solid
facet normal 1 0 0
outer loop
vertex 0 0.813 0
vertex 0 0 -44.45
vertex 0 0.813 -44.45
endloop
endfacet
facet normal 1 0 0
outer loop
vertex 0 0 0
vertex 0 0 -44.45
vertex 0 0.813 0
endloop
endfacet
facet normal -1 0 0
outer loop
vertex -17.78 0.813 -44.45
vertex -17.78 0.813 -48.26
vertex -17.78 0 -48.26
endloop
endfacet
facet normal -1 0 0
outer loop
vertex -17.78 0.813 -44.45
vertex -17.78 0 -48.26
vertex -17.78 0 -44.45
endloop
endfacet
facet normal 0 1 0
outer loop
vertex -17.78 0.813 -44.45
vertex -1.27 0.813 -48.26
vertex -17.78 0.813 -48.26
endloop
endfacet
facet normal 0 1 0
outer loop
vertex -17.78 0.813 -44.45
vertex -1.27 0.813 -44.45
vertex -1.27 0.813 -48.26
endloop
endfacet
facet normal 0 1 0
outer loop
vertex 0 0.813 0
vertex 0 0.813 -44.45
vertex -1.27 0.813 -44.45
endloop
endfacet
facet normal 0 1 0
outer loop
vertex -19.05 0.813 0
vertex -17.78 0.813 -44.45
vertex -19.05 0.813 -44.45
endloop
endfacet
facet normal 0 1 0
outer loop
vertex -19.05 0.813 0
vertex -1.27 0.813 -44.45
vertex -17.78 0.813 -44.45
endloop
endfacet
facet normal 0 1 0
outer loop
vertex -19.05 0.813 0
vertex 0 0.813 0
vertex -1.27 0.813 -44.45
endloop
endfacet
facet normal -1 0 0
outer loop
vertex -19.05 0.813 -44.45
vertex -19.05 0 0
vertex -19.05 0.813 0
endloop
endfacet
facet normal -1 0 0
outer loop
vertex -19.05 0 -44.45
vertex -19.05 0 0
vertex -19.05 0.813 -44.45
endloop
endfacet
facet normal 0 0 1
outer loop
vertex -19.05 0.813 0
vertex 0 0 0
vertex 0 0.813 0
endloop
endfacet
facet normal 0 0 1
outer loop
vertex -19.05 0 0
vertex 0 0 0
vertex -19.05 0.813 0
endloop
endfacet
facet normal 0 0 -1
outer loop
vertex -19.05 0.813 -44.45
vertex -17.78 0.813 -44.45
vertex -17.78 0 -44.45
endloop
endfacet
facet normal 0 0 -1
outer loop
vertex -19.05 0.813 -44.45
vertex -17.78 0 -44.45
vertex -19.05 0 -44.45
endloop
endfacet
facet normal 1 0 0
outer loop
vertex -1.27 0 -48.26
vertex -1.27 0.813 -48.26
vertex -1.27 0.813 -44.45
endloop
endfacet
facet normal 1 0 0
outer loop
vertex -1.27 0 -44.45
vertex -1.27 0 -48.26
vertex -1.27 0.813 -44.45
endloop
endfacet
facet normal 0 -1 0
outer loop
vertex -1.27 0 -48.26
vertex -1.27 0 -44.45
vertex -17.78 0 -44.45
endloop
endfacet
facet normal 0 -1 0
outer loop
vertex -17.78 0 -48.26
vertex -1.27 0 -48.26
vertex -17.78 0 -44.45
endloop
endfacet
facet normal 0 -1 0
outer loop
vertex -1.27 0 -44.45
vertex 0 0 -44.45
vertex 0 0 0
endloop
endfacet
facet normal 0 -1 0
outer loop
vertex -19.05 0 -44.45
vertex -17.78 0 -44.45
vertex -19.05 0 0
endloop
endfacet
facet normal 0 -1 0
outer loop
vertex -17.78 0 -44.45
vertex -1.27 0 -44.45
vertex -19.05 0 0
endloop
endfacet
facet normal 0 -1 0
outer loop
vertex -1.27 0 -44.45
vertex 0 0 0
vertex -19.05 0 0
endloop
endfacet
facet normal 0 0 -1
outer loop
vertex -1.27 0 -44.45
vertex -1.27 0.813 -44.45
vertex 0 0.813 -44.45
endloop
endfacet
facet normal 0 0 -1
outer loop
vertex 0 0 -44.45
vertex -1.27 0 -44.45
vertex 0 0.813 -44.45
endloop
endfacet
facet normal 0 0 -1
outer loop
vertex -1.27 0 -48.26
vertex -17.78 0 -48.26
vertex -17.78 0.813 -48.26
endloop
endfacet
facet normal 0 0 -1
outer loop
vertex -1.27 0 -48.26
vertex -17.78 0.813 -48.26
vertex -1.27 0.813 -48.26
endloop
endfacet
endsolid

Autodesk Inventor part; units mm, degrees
ref_plane "YZ Plane" through (0, 0, 0) normal (1, 0, 0) x (0, 1, 0)
ref_plane "XZ Plane" through (0, 0, 0) normal (0, 1, 0) x (-1, 0, 0)
ref_plane "XY Plane" through (0, 0, 0) normal (0, 0, 1) x (1, 0, 0)
sketch "Sketch1" plane through (0, 0, 0) normal (0, 1, 0) x (-1, 0, 0)
  line L0 (0, 0) -> (19.05, 0)
  line L1 (19.05, 0) -> (19.05, -48.26)
  line L2 (19.05, -48.26) -> (0, -48.26)
  line L3 (0, -48.26) -> (0, 0)
  dimension "d0" = 19.05
  dimension "d1" = 48.26
extrude "Extrusion1" add sketch "Sketch1" along normal blind 0.8128
sketch "Sketch2" plane through (0, 0.8128, 0) normal (0, 1, 0) x (1, 0, 0)
  line L0 (0, 0) -> (0, 48.26) projected
  line L1 (0, 48.26) -> (-1.27, 48.26)
  line L2 (-1.27, 48.26) -> (-1.27, 44.45)
  line L3 (-1.27, 44.45) -> (0, 44.45)
  line L4 (0, 44.45) -> (0, 48.26)
  point P0 (0, 44.45)
  dimension "d4" = 1.27
  dimension "d5" = 3.81
extrude "Extrusion2" cut sketch "Sketch2" against normal blind 0.8128
sketch "Sketch3" plane through (0, 0.8128, 0) normal (0, 1, 0) x (1, 0, 0)
  line L0 (-19.05, 48.26) -> (-19.05, 0) projected
  line L1 (-19.05, 48.26) -> (-17.78, 48.26)
  line L2 (-17.78, 48.26) -> (-17.78, 44.45)
  line L3 (-17.78, 44.45) -> (-19.05, 44.45)
  line L4 (-19.05, 44.45) -> (-19.05, 48.26)
  point P0 (0, 0)
  point P1 (-19.05, 44.45)
  dimension "d8" = 1.27
  dimension "d9" = 3.81
extrude "Extrusion3" cut sketch "Sketch3" against normal blind 0.8128
